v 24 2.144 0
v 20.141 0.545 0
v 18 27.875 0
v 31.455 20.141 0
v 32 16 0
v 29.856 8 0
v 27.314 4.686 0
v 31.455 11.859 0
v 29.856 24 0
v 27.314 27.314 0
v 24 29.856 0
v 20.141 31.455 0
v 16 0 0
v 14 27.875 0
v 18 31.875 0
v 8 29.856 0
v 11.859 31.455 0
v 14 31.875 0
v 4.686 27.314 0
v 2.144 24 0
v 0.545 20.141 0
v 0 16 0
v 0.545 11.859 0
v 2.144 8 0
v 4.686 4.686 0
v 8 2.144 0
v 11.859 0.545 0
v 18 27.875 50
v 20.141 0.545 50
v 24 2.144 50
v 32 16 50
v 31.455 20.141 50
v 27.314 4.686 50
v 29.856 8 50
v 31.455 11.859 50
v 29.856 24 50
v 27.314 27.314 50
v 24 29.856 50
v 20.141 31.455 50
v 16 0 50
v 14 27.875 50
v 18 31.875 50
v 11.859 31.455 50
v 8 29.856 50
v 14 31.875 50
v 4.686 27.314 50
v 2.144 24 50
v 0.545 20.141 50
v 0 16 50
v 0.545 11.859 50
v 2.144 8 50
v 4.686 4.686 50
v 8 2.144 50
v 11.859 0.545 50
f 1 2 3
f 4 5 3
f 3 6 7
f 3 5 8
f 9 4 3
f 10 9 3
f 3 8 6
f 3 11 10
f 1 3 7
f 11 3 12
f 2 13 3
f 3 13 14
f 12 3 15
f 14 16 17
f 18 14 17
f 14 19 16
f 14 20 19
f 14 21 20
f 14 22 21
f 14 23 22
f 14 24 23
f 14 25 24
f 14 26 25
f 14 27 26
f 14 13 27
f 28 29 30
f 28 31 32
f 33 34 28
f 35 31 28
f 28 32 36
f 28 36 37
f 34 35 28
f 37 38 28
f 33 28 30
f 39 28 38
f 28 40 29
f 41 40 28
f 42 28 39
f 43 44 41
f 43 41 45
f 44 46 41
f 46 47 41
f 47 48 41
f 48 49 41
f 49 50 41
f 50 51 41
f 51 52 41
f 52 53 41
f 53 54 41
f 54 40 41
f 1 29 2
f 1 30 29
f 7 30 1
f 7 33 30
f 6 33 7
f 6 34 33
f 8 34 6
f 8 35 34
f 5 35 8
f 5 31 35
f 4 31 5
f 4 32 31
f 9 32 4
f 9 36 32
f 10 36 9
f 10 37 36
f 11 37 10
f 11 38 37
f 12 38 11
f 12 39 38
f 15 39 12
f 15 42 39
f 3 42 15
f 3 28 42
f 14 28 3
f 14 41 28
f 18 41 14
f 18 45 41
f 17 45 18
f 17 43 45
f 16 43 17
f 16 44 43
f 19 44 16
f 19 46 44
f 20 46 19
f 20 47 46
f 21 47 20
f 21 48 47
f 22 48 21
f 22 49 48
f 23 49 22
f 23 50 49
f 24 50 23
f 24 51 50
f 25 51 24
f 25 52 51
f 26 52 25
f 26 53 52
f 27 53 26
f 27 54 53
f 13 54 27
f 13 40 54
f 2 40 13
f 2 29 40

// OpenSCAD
$fn = 32;

// ----------------------------------------------------------------------
// Keyway shaft: d32 shaft, key 4 x 4 mm
// ----------------------------------------------------------------------

// --- parameters (mm) ---
shaft_r = 16;             // shaft radius
key_w = 4;                // keyway width
key_d = 4;                // keyway depth below the surface line
plate_t = 50;             // shaft length, Z (extrusion height)

shaft_d = 2 * shaft_r;  // shaft diameter
circle_step = 15;  // polygon sampling step, degrees

profile = [[11.859, 31.455], [8, 29.856], [4.686, 27.314], [2.144, 24], [0.545, 20.141], [0, 16], [0.545, 11.859], [2.144, 8], [4.686, 4.686], [8, 2.144], [11.859, 0.545], [16, 0], [20.141, 0.545], [24, 2.144], [27.314, 4.686], [29.856, 8], [31.455, 11.859], [32, 16], [31.455, 20.141], [29.856, 24], [27.314, 27.314], [24, 29.856], [20.141, 31.455], [18, 31.875], [18, 27.875], [14, 27.875], [14, 31.875]];  // primary outline, 27 points, counter clockwise

// --- the one profile operation ---
linear_extrude(height = plate_t) polygon(points = profile);
